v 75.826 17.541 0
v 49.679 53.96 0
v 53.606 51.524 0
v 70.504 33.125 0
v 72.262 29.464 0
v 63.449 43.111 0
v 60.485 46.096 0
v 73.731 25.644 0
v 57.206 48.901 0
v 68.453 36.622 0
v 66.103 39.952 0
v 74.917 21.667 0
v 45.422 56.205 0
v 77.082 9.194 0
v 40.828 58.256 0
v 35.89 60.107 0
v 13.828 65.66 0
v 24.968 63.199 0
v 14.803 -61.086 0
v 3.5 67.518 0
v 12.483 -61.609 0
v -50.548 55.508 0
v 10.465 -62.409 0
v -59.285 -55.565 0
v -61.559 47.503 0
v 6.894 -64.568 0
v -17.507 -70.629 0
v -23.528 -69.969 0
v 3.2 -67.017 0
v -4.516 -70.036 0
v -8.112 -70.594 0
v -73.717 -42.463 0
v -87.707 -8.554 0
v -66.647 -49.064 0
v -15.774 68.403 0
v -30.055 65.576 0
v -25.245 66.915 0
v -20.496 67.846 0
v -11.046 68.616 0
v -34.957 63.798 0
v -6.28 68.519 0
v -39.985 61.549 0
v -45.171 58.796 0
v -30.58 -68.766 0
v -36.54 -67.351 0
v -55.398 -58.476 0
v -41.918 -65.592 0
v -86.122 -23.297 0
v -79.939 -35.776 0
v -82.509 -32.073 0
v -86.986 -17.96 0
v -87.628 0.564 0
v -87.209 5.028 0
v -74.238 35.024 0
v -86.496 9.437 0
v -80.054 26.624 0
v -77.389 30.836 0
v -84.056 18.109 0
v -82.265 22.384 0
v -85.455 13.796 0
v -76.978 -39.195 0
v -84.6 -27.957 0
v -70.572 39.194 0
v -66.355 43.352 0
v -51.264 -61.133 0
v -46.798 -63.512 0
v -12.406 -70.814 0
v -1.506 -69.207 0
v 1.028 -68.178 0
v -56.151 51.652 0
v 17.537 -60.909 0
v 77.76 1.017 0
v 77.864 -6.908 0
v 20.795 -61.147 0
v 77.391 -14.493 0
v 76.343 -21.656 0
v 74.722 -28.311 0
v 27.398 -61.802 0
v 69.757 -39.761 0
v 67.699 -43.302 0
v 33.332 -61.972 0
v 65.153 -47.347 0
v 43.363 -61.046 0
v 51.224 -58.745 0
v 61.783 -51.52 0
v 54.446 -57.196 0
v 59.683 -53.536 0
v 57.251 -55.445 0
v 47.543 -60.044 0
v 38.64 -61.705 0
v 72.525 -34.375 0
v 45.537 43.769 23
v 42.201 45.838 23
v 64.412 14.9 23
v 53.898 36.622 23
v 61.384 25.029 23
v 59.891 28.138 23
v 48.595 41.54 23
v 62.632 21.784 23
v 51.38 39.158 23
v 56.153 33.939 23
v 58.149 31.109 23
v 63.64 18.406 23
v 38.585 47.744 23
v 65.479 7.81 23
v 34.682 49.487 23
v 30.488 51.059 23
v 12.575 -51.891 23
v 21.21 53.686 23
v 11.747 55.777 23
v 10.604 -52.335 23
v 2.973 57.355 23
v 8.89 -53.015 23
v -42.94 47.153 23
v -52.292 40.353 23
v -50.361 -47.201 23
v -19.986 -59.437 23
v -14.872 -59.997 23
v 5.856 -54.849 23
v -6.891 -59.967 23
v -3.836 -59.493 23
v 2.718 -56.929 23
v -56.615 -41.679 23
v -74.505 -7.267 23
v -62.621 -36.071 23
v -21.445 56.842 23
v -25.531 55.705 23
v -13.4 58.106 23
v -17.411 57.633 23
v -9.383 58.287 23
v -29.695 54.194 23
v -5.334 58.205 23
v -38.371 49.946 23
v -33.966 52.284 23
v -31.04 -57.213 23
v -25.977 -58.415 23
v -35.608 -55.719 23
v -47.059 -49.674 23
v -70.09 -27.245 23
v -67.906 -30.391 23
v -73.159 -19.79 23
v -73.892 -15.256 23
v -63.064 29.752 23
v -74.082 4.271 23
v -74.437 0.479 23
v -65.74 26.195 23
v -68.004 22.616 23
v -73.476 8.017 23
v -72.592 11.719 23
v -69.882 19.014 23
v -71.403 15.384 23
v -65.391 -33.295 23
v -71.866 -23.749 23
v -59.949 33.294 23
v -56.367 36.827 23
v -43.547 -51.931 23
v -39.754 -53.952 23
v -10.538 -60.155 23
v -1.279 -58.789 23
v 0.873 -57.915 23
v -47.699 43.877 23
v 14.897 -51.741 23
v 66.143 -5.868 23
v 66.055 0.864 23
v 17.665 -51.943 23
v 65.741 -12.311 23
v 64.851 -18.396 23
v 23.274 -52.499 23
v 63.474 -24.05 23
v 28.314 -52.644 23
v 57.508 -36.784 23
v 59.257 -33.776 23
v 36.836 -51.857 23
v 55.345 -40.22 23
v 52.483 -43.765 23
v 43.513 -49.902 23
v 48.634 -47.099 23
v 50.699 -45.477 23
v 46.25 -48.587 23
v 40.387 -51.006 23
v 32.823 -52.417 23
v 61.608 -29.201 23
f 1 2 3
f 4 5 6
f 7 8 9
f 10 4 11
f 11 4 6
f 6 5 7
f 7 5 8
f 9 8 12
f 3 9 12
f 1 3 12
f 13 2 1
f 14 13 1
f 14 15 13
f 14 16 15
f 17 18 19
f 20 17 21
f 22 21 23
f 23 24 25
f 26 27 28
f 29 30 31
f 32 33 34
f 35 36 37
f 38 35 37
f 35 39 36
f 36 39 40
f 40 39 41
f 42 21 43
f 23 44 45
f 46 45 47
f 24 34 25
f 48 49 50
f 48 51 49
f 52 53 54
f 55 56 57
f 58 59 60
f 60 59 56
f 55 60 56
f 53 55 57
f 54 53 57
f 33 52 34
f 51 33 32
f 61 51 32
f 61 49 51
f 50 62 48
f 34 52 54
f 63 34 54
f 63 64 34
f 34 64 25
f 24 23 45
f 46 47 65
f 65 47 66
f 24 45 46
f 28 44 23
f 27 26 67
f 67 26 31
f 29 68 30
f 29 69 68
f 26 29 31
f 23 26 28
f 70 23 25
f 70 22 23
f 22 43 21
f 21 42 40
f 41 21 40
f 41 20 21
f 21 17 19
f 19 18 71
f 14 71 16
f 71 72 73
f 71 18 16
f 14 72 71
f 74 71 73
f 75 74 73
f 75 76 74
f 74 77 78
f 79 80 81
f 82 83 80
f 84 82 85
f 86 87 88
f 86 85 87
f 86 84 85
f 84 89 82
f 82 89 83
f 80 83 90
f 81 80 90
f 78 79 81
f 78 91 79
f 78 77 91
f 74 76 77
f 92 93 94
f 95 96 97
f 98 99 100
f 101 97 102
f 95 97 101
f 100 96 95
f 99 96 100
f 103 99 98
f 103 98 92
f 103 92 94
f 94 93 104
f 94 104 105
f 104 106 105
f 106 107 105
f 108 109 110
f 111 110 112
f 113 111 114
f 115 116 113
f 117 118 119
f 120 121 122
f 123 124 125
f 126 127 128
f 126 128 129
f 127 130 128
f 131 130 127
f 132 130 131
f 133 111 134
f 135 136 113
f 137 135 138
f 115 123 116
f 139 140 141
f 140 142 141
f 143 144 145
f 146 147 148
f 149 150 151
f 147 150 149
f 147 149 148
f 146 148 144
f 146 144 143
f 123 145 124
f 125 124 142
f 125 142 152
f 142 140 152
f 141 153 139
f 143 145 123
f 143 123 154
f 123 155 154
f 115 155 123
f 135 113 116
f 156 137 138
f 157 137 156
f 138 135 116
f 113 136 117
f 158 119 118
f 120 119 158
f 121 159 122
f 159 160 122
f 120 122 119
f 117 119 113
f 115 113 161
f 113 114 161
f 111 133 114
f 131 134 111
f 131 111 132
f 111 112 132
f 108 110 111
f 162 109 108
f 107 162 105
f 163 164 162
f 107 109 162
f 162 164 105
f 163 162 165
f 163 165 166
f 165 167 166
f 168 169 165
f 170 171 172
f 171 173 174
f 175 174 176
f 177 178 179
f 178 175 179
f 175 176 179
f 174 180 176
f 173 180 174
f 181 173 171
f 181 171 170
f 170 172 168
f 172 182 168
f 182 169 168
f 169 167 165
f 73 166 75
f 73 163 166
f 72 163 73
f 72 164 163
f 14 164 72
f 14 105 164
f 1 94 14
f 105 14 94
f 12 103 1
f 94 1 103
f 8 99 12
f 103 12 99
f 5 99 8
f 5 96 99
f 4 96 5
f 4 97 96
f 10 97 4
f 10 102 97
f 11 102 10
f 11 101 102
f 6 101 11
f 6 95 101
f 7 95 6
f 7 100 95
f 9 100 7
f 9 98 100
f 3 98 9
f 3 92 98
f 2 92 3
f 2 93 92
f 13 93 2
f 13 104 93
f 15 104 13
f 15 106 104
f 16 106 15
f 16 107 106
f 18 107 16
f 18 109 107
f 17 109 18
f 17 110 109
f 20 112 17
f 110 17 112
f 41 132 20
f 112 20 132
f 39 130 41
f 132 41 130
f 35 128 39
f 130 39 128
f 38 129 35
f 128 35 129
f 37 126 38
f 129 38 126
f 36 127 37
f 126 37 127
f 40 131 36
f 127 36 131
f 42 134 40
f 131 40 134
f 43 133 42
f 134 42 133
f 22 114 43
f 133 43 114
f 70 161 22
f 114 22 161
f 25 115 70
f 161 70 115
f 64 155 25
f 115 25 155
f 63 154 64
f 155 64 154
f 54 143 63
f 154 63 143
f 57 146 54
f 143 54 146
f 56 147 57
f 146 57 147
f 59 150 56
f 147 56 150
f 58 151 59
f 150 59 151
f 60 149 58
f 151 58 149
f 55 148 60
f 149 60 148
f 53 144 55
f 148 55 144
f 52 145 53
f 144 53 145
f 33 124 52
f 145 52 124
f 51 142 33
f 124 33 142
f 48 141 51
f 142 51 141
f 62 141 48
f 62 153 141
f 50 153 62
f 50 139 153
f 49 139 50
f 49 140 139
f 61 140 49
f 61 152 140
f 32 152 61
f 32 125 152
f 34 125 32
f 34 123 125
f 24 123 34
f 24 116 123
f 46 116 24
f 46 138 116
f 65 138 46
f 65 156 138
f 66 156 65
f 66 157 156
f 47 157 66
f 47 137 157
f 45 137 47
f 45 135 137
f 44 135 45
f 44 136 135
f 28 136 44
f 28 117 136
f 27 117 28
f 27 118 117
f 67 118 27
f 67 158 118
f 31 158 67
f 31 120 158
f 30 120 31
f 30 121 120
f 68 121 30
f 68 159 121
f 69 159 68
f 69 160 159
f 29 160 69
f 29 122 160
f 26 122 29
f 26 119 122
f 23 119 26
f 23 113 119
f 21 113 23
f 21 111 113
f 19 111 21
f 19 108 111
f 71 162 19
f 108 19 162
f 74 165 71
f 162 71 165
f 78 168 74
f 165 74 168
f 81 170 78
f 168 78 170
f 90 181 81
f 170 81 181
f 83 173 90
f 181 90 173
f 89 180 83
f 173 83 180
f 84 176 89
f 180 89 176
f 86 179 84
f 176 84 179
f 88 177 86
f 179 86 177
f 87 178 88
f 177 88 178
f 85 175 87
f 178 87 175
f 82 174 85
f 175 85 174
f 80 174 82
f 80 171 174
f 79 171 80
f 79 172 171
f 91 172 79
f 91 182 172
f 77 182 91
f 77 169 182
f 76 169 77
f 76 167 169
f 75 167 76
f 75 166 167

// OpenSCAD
// file: hillpolygon.scad
module hillFromPolygon(height = 23, angle = 30, convexity = 5) {
   $fn = 100;

   // estRadius calculates an estimated radius for the hill assuming that I've filled most of the
   // depth of the build plate (Y dimension) with the polygon. This is then used to scale the roof of
   // the polyhedral.
   estRadius = 0.95 * 150 / 2;
   inset = height * tan(angle);
   scaleFactor = (estRadius - inset) / estRadius;

   linear_extrude(height = height, convexity = convexity, scale=scaleFactor) child(0);
}
// main file
use <hillpolygon.scad>

% translate([0,0,155/2]) cube(size=[240, 153, 155], center=true);

hill3();

module hill3() {
   hillFromPolygon(angle=25) hill3Polygon();
}

module hill3Polygon() {
   translate([0,30,0]) rotate([0,0,80])
   polygon(points=
    [[-62.336, 77.336], [-53.199, 79.680], [-44.205, 81.185],
    [-39.736, 81.548], [-35.270, 81.611], [-30.797,
    81.343], [-26.306, 80.714], [-21.786, 79.693], [-17.226, 78.252],
    [-12.615, 76.359], [-7.944, 73.983], [-3.200, 71.096], [1.627,
    67.666], [6.548, 63.663], [11.573, 59.058], [16.343, 54.210],
    [20.515, 49.485], [24.126, 44.856], [27.214, 40.295], [29.817,
    35.776], [31.970, 31.272], [33.712, 26.757], [35.080, 22.203],
    [36.111, 17.584], [36.843, 12.873], [37.556, 3.068], [37.520,
    -7.426], [37.030, -18.824], [35.882, -30.117], [34.916, -35.301],
    [33.694, -40.182], [32.223, -44.764], [30.506, -49.054], [28.548,
    -53.055], [26.355, -56.771], [23.930, -60.208], [21.280, -63.371],
    [18.408, -66.263], [15.320, -68.890], [12.020, -71.257], [8.513,
    -73.367], [4.803, -75.226], [0.897, -76.838], [-7.105, -79.524],
    [-15.040, -81.612], [-22.826, -83.090], [-30.378, -83.941], [-37.614,
    -84.153], [-44.450, -83.712], [-50.803, -82.602], [-56.588, -80.811],
    [-60.433, -79.399], [-64.858, -77.594], [-69.553, -75.000], [-71.903,
    -73.282], [-74.205, -71.219], [-76.417, -68.760], [-78.502, -65.856],
    [-80.420, -62.457], [-82.133, -58.514], [-83.602, -53.977], [-84.787,
    -48.796], [-85.650, -42.923], [-86.151, -36.307], [-86.483, -33.057],
    [-87.132, -30.395], [-88.050, -28.201], [-89.188, -26.353], [-91.934,
    -23.211], [-94.987, -19.998], [-96.508, -18.061], [-97.961, -15.744],
    [-99.300, -12.924], [-100.474, -9.479], [-101.437, -5.289], [-102.140,
    -0.233], [-102.536, 5.811], [-102.576, 12.965], [-102.217, 19.080],
    [-101.419, 24.682], [-100.218, 29.849], [-98.650, 34.660], [-96.752,
    39.193], [-94.560, 43.526], [-89.436, 51.905], [-84.163, 60.014],
    [-81.511, 63.793], [-78.658, 67.303], [-75.458, 70.477], [-71.767,
    73.251], [-67.442, 75.559], [-62.336, 77.336]]
    , paths=
    [[0, 1, 2, 3, 4, 5, 6, 7, 8, 9, 10, 11, 12, 13, 14, 15, 16, 17,
    18, 19, 20, 21, 22, 23, 24, 25, 26, 27, 28,
    29, 30, 31, 32, 33, 34, 35, 36, 37, 38, 39, 40, 41, 42, 43, 44, 45,
    46, 47, 48, 49, 50, 51, 52, 53, 54, 55, 56, 57, 58, 59, 60, 61, 62,
    63, 64, 65, 66, 67, 68, 69, 70, 71, 72, 73, 74, 75, 76, 77, 78, 79,
    80, 81, 82, 83, 84, 85, 86, 87, 88, 89, 90, 91, 0]]
    );
}
